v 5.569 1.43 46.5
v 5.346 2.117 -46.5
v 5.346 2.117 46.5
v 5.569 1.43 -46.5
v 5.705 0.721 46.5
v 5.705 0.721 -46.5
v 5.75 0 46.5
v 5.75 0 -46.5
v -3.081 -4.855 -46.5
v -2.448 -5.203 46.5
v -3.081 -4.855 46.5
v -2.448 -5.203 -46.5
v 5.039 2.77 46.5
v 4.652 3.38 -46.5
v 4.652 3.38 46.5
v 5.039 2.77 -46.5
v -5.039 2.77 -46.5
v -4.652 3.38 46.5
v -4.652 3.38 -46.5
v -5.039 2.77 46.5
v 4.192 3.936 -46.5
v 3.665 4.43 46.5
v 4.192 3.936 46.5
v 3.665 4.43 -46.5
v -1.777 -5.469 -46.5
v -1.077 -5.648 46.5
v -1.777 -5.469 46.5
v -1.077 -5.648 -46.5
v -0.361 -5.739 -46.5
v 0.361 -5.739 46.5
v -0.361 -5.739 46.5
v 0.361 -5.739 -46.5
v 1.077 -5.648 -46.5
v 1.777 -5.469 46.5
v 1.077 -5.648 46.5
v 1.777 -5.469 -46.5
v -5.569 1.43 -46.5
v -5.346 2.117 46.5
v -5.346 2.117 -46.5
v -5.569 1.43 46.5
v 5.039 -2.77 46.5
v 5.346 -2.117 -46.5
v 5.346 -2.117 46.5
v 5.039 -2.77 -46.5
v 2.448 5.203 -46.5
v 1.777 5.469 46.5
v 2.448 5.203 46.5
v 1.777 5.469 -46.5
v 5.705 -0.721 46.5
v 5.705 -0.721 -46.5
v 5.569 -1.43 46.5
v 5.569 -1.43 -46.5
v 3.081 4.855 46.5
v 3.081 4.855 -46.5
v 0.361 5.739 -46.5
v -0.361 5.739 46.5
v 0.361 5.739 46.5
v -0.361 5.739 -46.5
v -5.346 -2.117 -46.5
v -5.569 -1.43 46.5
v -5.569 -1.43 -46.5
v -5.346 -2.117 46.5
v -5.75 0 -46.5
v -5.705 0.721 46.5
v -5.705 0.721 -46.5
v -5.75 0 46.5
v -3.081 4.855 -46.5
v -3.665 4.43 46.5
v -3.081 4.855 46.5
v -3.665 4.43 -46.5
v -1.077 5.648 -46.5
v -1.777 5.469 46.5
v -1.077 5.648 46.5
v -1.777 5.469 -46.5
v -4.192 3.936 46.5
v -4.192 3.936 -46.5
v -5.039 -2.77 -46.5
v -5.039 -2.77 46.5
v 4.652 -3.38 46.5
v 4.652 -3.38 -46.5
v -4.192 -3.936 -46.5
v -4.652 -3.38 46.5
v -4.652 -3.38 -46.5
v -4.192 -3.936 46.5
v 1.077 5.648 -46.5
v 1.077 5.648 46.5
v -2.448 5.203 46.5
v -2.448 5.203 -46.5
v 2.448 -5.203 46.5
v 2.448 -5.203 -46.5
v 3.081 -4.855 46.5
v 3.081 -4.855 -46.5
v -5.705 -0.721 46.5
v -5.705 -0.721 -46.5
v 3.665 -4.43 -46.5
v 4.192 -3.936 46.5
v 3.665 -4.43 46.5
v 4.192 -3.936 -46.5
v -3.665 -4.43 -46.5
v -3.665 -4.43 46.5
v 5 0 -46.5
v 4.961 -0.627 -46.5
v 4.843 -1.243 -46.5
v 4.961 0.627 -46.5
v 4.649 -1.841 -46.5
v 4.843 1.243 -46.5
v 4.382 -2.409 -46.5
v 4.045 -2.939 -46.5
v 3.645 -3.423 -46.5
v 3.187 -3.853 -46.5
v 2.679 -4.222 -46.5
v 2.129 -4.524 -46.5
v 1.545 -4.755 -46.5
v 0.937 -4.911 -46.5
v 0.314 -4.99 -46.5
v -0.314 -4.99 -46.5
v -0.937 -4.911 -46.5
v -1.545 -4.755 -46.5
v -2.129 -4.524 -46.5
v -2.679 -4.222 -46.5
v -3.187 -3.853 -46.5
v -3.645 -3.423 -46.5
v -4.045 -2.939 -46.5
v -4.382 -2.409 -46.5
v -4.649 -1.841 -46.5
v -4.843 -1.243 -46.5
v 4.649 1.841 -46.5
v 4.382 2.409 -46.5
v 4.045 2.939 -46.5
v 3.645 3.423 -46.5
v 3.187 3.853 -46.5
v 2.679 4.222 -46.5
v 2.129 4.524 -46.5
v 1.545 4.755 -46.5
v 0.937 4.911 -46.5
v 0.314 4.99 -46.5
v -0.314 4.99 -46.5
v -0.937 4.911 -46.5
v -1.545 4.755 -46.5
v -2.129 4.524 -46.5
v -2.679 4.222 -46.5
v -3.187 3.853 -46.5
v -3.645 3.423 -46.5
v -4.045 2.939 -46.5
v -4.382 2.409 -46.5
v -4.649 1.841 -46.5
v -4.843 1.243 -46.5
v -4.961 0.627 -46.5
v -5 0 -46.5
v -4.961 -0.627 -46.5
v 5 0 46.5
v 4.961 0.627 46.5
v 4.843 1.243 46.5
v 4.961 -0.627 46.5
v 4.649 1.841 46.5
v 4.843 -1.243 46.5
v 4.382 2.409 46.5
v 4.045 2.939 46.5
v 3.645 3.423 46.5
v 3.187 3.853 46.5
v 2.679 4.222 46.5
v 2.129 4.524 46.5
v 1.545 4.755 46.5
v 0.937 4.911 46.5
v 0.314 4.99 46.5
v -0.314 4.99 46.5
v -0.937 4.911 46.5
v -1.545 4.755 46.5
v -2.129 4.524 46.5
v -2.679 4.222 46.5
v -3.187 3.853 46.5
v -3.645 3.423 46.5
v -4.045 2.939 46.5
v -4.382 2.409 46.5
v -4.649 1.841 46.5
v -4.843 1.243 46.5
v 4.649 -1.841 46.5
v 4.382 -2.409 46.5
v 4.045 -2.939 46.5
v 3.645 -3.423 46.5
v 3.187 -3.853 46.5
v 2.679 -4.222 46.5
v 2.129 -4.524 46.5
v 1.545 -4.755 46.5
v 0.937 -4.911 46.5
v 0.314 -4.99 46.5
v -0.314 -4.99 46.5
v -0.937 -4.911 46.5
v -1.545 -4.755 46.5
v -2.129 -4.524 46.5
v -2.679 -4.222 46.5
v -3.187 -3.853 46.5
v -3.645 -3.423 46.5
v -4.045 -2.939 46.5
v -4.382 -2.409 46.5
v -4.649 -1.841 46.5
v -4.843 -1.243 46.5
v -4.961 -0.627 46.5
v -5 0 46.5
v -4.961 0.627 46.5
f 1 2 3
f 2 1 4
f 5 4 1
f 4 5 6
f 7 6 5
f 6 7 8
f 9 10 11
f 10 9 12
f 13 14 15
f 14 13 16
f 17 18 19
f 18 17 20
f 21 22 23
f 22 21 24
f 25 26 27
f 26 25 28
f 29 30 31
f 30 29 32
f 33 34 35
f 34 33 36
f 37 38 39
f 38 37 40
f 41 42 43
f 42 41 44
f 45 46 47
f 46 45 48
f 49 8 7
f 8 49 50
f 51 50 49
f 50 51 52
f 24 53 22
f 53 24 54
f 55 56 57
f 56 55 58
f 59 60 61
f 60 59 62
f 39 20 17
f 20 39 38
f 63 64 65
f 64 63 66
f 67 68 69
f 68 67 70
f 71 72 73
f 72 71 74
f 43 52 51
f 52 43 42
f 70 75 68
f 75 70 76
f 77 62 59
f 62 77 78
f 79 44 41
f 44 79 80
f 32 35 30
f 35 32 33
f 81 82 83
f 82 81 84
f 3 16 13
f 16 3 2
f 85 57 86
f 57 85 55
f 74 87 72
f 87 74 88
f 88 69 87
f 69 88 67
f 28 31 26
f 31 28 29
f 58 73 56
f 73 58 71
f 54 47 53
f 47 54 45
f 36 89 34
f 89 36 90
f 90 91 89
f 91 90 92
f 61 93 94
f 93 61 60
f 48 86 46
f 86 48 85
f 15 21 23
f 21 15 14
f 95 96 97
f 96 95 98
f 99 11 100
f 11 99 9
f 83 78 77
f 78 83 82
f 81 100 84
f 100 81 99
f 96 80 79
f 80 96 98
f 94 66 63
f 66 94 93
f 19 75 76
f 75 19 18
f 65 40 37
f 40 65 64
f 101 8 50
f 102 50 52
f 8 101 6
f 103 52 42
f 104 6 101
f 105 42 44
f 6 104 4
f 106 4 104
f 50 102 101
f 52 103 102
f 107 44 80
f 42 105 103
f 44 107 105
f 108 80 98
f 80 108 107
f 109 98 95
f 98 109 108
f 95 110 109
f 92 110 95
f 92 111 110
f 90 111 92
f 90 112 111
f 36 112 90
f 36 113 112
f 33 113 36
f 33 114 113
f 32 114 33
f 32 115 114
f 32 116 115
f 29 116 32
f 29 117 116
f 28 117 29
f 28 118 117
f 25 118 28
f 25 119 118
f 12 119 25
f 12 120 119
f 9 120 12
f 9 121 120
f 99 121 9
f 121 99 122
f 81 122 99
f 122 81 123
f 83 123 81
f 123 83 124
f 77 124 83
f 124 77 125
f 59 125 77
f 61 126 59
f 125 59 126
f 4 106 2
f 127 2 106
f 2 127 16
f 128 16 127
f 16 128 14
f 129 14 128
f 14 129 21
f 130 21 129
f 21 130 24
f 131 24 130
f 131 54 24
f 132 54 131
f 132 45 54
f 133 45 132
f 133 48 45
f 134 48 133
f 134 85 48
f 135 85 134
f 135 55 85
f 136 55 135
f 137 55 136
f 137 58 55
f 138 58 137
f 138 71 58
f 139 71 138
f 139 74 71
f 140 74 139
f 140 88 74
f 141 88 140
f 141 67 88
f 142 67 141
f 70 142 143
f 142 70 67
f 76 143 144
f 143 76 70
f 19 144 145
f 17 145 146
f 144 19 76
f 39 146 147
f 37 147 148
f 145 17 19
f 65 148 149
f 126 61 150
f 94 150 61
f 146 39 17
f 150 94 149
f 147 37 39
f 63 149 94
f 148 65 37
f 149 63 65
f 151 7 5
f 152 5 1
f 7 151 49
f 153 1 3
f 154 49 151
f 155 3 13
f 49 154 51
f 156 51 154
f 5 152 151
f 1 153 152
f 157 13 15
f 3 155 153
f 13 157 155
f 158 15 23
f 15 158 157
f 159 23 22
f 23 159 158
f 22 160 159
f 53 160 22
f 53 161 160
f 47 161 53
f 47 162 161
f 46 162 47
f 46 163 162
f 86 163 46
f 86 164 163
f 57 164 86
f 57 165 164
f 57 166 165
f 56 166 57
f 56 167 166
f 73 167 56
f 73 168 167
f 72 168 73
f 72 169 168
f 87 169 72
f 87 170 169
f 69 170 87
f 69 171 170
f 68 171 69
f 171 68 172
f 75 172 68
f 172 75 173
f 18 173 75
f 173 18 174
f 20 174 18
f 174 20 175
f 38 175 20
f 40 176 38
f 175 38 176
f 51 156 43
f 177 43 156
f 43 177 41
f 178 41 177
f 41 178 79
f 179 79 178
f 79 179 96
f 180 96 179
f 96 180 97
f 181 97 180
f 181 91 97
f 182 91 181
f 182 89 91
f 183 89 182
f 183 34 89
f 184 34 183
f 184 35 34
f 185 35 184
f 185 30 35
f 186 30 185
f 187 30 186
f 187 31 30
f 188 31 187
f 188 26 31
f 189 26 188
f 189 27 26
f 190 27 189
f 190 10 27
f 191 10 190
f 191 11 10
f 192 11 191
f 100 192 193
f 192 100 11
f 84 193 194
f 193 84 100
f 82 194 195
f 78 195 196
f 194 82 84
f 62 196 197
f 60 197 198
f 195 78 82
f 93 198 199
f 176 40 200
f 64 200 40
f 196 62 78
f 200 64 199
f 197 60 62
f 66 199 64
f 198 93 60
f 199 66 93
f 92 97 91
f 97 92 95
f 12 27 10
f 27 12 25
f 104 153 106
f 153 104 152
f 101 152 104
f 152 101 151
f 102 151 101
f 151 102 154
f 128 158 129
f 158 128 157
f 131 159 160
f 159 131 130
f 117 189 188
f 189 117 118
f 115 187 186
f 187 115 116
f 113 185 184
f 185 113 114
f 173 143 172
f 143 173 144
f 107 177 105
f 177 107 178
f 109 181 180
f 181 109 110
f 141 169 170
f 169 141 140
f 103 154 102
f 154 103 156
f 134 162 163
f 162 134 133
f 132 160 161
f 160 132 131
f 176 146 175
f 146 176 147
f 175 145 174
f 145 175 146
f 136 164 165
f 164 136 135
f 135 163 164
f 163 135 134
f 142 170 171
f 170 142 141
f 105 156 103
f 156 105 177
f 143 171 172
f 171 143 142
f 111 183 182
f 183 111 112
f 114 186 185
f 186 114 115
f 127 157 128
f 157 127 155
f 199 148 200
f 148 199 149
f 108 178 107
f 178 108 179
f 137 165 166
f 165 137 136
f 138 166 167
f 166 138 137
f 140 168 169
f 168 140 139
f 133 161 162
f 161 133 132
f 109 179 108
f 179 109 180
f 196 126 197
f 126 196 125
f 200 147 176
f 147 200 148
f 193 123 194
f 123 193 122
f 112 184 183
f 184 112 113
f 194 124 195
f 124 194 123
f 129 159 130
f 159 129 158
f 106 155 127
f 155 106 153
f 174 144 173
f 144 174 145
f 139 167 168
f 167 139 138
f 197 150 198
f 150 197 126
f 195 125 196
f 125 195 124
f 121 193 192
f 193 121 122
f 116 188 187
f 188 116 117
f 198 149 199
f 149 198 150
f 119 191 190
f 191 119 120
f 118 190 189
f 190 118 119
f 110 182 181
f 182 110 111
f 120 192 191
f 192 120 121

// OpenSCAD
$fn = 50;


difference() {
	union() {
		translate(v = [0, 0, -46.5000000000]) {
			cylinder(h = 93, r = 5.7500000000);
		}
	}
	union() {
		translate(v = [0, 0, -100.0000000000]) {
			cylinder(h = 200, r = 5.0000000000);
		}
	}
}
